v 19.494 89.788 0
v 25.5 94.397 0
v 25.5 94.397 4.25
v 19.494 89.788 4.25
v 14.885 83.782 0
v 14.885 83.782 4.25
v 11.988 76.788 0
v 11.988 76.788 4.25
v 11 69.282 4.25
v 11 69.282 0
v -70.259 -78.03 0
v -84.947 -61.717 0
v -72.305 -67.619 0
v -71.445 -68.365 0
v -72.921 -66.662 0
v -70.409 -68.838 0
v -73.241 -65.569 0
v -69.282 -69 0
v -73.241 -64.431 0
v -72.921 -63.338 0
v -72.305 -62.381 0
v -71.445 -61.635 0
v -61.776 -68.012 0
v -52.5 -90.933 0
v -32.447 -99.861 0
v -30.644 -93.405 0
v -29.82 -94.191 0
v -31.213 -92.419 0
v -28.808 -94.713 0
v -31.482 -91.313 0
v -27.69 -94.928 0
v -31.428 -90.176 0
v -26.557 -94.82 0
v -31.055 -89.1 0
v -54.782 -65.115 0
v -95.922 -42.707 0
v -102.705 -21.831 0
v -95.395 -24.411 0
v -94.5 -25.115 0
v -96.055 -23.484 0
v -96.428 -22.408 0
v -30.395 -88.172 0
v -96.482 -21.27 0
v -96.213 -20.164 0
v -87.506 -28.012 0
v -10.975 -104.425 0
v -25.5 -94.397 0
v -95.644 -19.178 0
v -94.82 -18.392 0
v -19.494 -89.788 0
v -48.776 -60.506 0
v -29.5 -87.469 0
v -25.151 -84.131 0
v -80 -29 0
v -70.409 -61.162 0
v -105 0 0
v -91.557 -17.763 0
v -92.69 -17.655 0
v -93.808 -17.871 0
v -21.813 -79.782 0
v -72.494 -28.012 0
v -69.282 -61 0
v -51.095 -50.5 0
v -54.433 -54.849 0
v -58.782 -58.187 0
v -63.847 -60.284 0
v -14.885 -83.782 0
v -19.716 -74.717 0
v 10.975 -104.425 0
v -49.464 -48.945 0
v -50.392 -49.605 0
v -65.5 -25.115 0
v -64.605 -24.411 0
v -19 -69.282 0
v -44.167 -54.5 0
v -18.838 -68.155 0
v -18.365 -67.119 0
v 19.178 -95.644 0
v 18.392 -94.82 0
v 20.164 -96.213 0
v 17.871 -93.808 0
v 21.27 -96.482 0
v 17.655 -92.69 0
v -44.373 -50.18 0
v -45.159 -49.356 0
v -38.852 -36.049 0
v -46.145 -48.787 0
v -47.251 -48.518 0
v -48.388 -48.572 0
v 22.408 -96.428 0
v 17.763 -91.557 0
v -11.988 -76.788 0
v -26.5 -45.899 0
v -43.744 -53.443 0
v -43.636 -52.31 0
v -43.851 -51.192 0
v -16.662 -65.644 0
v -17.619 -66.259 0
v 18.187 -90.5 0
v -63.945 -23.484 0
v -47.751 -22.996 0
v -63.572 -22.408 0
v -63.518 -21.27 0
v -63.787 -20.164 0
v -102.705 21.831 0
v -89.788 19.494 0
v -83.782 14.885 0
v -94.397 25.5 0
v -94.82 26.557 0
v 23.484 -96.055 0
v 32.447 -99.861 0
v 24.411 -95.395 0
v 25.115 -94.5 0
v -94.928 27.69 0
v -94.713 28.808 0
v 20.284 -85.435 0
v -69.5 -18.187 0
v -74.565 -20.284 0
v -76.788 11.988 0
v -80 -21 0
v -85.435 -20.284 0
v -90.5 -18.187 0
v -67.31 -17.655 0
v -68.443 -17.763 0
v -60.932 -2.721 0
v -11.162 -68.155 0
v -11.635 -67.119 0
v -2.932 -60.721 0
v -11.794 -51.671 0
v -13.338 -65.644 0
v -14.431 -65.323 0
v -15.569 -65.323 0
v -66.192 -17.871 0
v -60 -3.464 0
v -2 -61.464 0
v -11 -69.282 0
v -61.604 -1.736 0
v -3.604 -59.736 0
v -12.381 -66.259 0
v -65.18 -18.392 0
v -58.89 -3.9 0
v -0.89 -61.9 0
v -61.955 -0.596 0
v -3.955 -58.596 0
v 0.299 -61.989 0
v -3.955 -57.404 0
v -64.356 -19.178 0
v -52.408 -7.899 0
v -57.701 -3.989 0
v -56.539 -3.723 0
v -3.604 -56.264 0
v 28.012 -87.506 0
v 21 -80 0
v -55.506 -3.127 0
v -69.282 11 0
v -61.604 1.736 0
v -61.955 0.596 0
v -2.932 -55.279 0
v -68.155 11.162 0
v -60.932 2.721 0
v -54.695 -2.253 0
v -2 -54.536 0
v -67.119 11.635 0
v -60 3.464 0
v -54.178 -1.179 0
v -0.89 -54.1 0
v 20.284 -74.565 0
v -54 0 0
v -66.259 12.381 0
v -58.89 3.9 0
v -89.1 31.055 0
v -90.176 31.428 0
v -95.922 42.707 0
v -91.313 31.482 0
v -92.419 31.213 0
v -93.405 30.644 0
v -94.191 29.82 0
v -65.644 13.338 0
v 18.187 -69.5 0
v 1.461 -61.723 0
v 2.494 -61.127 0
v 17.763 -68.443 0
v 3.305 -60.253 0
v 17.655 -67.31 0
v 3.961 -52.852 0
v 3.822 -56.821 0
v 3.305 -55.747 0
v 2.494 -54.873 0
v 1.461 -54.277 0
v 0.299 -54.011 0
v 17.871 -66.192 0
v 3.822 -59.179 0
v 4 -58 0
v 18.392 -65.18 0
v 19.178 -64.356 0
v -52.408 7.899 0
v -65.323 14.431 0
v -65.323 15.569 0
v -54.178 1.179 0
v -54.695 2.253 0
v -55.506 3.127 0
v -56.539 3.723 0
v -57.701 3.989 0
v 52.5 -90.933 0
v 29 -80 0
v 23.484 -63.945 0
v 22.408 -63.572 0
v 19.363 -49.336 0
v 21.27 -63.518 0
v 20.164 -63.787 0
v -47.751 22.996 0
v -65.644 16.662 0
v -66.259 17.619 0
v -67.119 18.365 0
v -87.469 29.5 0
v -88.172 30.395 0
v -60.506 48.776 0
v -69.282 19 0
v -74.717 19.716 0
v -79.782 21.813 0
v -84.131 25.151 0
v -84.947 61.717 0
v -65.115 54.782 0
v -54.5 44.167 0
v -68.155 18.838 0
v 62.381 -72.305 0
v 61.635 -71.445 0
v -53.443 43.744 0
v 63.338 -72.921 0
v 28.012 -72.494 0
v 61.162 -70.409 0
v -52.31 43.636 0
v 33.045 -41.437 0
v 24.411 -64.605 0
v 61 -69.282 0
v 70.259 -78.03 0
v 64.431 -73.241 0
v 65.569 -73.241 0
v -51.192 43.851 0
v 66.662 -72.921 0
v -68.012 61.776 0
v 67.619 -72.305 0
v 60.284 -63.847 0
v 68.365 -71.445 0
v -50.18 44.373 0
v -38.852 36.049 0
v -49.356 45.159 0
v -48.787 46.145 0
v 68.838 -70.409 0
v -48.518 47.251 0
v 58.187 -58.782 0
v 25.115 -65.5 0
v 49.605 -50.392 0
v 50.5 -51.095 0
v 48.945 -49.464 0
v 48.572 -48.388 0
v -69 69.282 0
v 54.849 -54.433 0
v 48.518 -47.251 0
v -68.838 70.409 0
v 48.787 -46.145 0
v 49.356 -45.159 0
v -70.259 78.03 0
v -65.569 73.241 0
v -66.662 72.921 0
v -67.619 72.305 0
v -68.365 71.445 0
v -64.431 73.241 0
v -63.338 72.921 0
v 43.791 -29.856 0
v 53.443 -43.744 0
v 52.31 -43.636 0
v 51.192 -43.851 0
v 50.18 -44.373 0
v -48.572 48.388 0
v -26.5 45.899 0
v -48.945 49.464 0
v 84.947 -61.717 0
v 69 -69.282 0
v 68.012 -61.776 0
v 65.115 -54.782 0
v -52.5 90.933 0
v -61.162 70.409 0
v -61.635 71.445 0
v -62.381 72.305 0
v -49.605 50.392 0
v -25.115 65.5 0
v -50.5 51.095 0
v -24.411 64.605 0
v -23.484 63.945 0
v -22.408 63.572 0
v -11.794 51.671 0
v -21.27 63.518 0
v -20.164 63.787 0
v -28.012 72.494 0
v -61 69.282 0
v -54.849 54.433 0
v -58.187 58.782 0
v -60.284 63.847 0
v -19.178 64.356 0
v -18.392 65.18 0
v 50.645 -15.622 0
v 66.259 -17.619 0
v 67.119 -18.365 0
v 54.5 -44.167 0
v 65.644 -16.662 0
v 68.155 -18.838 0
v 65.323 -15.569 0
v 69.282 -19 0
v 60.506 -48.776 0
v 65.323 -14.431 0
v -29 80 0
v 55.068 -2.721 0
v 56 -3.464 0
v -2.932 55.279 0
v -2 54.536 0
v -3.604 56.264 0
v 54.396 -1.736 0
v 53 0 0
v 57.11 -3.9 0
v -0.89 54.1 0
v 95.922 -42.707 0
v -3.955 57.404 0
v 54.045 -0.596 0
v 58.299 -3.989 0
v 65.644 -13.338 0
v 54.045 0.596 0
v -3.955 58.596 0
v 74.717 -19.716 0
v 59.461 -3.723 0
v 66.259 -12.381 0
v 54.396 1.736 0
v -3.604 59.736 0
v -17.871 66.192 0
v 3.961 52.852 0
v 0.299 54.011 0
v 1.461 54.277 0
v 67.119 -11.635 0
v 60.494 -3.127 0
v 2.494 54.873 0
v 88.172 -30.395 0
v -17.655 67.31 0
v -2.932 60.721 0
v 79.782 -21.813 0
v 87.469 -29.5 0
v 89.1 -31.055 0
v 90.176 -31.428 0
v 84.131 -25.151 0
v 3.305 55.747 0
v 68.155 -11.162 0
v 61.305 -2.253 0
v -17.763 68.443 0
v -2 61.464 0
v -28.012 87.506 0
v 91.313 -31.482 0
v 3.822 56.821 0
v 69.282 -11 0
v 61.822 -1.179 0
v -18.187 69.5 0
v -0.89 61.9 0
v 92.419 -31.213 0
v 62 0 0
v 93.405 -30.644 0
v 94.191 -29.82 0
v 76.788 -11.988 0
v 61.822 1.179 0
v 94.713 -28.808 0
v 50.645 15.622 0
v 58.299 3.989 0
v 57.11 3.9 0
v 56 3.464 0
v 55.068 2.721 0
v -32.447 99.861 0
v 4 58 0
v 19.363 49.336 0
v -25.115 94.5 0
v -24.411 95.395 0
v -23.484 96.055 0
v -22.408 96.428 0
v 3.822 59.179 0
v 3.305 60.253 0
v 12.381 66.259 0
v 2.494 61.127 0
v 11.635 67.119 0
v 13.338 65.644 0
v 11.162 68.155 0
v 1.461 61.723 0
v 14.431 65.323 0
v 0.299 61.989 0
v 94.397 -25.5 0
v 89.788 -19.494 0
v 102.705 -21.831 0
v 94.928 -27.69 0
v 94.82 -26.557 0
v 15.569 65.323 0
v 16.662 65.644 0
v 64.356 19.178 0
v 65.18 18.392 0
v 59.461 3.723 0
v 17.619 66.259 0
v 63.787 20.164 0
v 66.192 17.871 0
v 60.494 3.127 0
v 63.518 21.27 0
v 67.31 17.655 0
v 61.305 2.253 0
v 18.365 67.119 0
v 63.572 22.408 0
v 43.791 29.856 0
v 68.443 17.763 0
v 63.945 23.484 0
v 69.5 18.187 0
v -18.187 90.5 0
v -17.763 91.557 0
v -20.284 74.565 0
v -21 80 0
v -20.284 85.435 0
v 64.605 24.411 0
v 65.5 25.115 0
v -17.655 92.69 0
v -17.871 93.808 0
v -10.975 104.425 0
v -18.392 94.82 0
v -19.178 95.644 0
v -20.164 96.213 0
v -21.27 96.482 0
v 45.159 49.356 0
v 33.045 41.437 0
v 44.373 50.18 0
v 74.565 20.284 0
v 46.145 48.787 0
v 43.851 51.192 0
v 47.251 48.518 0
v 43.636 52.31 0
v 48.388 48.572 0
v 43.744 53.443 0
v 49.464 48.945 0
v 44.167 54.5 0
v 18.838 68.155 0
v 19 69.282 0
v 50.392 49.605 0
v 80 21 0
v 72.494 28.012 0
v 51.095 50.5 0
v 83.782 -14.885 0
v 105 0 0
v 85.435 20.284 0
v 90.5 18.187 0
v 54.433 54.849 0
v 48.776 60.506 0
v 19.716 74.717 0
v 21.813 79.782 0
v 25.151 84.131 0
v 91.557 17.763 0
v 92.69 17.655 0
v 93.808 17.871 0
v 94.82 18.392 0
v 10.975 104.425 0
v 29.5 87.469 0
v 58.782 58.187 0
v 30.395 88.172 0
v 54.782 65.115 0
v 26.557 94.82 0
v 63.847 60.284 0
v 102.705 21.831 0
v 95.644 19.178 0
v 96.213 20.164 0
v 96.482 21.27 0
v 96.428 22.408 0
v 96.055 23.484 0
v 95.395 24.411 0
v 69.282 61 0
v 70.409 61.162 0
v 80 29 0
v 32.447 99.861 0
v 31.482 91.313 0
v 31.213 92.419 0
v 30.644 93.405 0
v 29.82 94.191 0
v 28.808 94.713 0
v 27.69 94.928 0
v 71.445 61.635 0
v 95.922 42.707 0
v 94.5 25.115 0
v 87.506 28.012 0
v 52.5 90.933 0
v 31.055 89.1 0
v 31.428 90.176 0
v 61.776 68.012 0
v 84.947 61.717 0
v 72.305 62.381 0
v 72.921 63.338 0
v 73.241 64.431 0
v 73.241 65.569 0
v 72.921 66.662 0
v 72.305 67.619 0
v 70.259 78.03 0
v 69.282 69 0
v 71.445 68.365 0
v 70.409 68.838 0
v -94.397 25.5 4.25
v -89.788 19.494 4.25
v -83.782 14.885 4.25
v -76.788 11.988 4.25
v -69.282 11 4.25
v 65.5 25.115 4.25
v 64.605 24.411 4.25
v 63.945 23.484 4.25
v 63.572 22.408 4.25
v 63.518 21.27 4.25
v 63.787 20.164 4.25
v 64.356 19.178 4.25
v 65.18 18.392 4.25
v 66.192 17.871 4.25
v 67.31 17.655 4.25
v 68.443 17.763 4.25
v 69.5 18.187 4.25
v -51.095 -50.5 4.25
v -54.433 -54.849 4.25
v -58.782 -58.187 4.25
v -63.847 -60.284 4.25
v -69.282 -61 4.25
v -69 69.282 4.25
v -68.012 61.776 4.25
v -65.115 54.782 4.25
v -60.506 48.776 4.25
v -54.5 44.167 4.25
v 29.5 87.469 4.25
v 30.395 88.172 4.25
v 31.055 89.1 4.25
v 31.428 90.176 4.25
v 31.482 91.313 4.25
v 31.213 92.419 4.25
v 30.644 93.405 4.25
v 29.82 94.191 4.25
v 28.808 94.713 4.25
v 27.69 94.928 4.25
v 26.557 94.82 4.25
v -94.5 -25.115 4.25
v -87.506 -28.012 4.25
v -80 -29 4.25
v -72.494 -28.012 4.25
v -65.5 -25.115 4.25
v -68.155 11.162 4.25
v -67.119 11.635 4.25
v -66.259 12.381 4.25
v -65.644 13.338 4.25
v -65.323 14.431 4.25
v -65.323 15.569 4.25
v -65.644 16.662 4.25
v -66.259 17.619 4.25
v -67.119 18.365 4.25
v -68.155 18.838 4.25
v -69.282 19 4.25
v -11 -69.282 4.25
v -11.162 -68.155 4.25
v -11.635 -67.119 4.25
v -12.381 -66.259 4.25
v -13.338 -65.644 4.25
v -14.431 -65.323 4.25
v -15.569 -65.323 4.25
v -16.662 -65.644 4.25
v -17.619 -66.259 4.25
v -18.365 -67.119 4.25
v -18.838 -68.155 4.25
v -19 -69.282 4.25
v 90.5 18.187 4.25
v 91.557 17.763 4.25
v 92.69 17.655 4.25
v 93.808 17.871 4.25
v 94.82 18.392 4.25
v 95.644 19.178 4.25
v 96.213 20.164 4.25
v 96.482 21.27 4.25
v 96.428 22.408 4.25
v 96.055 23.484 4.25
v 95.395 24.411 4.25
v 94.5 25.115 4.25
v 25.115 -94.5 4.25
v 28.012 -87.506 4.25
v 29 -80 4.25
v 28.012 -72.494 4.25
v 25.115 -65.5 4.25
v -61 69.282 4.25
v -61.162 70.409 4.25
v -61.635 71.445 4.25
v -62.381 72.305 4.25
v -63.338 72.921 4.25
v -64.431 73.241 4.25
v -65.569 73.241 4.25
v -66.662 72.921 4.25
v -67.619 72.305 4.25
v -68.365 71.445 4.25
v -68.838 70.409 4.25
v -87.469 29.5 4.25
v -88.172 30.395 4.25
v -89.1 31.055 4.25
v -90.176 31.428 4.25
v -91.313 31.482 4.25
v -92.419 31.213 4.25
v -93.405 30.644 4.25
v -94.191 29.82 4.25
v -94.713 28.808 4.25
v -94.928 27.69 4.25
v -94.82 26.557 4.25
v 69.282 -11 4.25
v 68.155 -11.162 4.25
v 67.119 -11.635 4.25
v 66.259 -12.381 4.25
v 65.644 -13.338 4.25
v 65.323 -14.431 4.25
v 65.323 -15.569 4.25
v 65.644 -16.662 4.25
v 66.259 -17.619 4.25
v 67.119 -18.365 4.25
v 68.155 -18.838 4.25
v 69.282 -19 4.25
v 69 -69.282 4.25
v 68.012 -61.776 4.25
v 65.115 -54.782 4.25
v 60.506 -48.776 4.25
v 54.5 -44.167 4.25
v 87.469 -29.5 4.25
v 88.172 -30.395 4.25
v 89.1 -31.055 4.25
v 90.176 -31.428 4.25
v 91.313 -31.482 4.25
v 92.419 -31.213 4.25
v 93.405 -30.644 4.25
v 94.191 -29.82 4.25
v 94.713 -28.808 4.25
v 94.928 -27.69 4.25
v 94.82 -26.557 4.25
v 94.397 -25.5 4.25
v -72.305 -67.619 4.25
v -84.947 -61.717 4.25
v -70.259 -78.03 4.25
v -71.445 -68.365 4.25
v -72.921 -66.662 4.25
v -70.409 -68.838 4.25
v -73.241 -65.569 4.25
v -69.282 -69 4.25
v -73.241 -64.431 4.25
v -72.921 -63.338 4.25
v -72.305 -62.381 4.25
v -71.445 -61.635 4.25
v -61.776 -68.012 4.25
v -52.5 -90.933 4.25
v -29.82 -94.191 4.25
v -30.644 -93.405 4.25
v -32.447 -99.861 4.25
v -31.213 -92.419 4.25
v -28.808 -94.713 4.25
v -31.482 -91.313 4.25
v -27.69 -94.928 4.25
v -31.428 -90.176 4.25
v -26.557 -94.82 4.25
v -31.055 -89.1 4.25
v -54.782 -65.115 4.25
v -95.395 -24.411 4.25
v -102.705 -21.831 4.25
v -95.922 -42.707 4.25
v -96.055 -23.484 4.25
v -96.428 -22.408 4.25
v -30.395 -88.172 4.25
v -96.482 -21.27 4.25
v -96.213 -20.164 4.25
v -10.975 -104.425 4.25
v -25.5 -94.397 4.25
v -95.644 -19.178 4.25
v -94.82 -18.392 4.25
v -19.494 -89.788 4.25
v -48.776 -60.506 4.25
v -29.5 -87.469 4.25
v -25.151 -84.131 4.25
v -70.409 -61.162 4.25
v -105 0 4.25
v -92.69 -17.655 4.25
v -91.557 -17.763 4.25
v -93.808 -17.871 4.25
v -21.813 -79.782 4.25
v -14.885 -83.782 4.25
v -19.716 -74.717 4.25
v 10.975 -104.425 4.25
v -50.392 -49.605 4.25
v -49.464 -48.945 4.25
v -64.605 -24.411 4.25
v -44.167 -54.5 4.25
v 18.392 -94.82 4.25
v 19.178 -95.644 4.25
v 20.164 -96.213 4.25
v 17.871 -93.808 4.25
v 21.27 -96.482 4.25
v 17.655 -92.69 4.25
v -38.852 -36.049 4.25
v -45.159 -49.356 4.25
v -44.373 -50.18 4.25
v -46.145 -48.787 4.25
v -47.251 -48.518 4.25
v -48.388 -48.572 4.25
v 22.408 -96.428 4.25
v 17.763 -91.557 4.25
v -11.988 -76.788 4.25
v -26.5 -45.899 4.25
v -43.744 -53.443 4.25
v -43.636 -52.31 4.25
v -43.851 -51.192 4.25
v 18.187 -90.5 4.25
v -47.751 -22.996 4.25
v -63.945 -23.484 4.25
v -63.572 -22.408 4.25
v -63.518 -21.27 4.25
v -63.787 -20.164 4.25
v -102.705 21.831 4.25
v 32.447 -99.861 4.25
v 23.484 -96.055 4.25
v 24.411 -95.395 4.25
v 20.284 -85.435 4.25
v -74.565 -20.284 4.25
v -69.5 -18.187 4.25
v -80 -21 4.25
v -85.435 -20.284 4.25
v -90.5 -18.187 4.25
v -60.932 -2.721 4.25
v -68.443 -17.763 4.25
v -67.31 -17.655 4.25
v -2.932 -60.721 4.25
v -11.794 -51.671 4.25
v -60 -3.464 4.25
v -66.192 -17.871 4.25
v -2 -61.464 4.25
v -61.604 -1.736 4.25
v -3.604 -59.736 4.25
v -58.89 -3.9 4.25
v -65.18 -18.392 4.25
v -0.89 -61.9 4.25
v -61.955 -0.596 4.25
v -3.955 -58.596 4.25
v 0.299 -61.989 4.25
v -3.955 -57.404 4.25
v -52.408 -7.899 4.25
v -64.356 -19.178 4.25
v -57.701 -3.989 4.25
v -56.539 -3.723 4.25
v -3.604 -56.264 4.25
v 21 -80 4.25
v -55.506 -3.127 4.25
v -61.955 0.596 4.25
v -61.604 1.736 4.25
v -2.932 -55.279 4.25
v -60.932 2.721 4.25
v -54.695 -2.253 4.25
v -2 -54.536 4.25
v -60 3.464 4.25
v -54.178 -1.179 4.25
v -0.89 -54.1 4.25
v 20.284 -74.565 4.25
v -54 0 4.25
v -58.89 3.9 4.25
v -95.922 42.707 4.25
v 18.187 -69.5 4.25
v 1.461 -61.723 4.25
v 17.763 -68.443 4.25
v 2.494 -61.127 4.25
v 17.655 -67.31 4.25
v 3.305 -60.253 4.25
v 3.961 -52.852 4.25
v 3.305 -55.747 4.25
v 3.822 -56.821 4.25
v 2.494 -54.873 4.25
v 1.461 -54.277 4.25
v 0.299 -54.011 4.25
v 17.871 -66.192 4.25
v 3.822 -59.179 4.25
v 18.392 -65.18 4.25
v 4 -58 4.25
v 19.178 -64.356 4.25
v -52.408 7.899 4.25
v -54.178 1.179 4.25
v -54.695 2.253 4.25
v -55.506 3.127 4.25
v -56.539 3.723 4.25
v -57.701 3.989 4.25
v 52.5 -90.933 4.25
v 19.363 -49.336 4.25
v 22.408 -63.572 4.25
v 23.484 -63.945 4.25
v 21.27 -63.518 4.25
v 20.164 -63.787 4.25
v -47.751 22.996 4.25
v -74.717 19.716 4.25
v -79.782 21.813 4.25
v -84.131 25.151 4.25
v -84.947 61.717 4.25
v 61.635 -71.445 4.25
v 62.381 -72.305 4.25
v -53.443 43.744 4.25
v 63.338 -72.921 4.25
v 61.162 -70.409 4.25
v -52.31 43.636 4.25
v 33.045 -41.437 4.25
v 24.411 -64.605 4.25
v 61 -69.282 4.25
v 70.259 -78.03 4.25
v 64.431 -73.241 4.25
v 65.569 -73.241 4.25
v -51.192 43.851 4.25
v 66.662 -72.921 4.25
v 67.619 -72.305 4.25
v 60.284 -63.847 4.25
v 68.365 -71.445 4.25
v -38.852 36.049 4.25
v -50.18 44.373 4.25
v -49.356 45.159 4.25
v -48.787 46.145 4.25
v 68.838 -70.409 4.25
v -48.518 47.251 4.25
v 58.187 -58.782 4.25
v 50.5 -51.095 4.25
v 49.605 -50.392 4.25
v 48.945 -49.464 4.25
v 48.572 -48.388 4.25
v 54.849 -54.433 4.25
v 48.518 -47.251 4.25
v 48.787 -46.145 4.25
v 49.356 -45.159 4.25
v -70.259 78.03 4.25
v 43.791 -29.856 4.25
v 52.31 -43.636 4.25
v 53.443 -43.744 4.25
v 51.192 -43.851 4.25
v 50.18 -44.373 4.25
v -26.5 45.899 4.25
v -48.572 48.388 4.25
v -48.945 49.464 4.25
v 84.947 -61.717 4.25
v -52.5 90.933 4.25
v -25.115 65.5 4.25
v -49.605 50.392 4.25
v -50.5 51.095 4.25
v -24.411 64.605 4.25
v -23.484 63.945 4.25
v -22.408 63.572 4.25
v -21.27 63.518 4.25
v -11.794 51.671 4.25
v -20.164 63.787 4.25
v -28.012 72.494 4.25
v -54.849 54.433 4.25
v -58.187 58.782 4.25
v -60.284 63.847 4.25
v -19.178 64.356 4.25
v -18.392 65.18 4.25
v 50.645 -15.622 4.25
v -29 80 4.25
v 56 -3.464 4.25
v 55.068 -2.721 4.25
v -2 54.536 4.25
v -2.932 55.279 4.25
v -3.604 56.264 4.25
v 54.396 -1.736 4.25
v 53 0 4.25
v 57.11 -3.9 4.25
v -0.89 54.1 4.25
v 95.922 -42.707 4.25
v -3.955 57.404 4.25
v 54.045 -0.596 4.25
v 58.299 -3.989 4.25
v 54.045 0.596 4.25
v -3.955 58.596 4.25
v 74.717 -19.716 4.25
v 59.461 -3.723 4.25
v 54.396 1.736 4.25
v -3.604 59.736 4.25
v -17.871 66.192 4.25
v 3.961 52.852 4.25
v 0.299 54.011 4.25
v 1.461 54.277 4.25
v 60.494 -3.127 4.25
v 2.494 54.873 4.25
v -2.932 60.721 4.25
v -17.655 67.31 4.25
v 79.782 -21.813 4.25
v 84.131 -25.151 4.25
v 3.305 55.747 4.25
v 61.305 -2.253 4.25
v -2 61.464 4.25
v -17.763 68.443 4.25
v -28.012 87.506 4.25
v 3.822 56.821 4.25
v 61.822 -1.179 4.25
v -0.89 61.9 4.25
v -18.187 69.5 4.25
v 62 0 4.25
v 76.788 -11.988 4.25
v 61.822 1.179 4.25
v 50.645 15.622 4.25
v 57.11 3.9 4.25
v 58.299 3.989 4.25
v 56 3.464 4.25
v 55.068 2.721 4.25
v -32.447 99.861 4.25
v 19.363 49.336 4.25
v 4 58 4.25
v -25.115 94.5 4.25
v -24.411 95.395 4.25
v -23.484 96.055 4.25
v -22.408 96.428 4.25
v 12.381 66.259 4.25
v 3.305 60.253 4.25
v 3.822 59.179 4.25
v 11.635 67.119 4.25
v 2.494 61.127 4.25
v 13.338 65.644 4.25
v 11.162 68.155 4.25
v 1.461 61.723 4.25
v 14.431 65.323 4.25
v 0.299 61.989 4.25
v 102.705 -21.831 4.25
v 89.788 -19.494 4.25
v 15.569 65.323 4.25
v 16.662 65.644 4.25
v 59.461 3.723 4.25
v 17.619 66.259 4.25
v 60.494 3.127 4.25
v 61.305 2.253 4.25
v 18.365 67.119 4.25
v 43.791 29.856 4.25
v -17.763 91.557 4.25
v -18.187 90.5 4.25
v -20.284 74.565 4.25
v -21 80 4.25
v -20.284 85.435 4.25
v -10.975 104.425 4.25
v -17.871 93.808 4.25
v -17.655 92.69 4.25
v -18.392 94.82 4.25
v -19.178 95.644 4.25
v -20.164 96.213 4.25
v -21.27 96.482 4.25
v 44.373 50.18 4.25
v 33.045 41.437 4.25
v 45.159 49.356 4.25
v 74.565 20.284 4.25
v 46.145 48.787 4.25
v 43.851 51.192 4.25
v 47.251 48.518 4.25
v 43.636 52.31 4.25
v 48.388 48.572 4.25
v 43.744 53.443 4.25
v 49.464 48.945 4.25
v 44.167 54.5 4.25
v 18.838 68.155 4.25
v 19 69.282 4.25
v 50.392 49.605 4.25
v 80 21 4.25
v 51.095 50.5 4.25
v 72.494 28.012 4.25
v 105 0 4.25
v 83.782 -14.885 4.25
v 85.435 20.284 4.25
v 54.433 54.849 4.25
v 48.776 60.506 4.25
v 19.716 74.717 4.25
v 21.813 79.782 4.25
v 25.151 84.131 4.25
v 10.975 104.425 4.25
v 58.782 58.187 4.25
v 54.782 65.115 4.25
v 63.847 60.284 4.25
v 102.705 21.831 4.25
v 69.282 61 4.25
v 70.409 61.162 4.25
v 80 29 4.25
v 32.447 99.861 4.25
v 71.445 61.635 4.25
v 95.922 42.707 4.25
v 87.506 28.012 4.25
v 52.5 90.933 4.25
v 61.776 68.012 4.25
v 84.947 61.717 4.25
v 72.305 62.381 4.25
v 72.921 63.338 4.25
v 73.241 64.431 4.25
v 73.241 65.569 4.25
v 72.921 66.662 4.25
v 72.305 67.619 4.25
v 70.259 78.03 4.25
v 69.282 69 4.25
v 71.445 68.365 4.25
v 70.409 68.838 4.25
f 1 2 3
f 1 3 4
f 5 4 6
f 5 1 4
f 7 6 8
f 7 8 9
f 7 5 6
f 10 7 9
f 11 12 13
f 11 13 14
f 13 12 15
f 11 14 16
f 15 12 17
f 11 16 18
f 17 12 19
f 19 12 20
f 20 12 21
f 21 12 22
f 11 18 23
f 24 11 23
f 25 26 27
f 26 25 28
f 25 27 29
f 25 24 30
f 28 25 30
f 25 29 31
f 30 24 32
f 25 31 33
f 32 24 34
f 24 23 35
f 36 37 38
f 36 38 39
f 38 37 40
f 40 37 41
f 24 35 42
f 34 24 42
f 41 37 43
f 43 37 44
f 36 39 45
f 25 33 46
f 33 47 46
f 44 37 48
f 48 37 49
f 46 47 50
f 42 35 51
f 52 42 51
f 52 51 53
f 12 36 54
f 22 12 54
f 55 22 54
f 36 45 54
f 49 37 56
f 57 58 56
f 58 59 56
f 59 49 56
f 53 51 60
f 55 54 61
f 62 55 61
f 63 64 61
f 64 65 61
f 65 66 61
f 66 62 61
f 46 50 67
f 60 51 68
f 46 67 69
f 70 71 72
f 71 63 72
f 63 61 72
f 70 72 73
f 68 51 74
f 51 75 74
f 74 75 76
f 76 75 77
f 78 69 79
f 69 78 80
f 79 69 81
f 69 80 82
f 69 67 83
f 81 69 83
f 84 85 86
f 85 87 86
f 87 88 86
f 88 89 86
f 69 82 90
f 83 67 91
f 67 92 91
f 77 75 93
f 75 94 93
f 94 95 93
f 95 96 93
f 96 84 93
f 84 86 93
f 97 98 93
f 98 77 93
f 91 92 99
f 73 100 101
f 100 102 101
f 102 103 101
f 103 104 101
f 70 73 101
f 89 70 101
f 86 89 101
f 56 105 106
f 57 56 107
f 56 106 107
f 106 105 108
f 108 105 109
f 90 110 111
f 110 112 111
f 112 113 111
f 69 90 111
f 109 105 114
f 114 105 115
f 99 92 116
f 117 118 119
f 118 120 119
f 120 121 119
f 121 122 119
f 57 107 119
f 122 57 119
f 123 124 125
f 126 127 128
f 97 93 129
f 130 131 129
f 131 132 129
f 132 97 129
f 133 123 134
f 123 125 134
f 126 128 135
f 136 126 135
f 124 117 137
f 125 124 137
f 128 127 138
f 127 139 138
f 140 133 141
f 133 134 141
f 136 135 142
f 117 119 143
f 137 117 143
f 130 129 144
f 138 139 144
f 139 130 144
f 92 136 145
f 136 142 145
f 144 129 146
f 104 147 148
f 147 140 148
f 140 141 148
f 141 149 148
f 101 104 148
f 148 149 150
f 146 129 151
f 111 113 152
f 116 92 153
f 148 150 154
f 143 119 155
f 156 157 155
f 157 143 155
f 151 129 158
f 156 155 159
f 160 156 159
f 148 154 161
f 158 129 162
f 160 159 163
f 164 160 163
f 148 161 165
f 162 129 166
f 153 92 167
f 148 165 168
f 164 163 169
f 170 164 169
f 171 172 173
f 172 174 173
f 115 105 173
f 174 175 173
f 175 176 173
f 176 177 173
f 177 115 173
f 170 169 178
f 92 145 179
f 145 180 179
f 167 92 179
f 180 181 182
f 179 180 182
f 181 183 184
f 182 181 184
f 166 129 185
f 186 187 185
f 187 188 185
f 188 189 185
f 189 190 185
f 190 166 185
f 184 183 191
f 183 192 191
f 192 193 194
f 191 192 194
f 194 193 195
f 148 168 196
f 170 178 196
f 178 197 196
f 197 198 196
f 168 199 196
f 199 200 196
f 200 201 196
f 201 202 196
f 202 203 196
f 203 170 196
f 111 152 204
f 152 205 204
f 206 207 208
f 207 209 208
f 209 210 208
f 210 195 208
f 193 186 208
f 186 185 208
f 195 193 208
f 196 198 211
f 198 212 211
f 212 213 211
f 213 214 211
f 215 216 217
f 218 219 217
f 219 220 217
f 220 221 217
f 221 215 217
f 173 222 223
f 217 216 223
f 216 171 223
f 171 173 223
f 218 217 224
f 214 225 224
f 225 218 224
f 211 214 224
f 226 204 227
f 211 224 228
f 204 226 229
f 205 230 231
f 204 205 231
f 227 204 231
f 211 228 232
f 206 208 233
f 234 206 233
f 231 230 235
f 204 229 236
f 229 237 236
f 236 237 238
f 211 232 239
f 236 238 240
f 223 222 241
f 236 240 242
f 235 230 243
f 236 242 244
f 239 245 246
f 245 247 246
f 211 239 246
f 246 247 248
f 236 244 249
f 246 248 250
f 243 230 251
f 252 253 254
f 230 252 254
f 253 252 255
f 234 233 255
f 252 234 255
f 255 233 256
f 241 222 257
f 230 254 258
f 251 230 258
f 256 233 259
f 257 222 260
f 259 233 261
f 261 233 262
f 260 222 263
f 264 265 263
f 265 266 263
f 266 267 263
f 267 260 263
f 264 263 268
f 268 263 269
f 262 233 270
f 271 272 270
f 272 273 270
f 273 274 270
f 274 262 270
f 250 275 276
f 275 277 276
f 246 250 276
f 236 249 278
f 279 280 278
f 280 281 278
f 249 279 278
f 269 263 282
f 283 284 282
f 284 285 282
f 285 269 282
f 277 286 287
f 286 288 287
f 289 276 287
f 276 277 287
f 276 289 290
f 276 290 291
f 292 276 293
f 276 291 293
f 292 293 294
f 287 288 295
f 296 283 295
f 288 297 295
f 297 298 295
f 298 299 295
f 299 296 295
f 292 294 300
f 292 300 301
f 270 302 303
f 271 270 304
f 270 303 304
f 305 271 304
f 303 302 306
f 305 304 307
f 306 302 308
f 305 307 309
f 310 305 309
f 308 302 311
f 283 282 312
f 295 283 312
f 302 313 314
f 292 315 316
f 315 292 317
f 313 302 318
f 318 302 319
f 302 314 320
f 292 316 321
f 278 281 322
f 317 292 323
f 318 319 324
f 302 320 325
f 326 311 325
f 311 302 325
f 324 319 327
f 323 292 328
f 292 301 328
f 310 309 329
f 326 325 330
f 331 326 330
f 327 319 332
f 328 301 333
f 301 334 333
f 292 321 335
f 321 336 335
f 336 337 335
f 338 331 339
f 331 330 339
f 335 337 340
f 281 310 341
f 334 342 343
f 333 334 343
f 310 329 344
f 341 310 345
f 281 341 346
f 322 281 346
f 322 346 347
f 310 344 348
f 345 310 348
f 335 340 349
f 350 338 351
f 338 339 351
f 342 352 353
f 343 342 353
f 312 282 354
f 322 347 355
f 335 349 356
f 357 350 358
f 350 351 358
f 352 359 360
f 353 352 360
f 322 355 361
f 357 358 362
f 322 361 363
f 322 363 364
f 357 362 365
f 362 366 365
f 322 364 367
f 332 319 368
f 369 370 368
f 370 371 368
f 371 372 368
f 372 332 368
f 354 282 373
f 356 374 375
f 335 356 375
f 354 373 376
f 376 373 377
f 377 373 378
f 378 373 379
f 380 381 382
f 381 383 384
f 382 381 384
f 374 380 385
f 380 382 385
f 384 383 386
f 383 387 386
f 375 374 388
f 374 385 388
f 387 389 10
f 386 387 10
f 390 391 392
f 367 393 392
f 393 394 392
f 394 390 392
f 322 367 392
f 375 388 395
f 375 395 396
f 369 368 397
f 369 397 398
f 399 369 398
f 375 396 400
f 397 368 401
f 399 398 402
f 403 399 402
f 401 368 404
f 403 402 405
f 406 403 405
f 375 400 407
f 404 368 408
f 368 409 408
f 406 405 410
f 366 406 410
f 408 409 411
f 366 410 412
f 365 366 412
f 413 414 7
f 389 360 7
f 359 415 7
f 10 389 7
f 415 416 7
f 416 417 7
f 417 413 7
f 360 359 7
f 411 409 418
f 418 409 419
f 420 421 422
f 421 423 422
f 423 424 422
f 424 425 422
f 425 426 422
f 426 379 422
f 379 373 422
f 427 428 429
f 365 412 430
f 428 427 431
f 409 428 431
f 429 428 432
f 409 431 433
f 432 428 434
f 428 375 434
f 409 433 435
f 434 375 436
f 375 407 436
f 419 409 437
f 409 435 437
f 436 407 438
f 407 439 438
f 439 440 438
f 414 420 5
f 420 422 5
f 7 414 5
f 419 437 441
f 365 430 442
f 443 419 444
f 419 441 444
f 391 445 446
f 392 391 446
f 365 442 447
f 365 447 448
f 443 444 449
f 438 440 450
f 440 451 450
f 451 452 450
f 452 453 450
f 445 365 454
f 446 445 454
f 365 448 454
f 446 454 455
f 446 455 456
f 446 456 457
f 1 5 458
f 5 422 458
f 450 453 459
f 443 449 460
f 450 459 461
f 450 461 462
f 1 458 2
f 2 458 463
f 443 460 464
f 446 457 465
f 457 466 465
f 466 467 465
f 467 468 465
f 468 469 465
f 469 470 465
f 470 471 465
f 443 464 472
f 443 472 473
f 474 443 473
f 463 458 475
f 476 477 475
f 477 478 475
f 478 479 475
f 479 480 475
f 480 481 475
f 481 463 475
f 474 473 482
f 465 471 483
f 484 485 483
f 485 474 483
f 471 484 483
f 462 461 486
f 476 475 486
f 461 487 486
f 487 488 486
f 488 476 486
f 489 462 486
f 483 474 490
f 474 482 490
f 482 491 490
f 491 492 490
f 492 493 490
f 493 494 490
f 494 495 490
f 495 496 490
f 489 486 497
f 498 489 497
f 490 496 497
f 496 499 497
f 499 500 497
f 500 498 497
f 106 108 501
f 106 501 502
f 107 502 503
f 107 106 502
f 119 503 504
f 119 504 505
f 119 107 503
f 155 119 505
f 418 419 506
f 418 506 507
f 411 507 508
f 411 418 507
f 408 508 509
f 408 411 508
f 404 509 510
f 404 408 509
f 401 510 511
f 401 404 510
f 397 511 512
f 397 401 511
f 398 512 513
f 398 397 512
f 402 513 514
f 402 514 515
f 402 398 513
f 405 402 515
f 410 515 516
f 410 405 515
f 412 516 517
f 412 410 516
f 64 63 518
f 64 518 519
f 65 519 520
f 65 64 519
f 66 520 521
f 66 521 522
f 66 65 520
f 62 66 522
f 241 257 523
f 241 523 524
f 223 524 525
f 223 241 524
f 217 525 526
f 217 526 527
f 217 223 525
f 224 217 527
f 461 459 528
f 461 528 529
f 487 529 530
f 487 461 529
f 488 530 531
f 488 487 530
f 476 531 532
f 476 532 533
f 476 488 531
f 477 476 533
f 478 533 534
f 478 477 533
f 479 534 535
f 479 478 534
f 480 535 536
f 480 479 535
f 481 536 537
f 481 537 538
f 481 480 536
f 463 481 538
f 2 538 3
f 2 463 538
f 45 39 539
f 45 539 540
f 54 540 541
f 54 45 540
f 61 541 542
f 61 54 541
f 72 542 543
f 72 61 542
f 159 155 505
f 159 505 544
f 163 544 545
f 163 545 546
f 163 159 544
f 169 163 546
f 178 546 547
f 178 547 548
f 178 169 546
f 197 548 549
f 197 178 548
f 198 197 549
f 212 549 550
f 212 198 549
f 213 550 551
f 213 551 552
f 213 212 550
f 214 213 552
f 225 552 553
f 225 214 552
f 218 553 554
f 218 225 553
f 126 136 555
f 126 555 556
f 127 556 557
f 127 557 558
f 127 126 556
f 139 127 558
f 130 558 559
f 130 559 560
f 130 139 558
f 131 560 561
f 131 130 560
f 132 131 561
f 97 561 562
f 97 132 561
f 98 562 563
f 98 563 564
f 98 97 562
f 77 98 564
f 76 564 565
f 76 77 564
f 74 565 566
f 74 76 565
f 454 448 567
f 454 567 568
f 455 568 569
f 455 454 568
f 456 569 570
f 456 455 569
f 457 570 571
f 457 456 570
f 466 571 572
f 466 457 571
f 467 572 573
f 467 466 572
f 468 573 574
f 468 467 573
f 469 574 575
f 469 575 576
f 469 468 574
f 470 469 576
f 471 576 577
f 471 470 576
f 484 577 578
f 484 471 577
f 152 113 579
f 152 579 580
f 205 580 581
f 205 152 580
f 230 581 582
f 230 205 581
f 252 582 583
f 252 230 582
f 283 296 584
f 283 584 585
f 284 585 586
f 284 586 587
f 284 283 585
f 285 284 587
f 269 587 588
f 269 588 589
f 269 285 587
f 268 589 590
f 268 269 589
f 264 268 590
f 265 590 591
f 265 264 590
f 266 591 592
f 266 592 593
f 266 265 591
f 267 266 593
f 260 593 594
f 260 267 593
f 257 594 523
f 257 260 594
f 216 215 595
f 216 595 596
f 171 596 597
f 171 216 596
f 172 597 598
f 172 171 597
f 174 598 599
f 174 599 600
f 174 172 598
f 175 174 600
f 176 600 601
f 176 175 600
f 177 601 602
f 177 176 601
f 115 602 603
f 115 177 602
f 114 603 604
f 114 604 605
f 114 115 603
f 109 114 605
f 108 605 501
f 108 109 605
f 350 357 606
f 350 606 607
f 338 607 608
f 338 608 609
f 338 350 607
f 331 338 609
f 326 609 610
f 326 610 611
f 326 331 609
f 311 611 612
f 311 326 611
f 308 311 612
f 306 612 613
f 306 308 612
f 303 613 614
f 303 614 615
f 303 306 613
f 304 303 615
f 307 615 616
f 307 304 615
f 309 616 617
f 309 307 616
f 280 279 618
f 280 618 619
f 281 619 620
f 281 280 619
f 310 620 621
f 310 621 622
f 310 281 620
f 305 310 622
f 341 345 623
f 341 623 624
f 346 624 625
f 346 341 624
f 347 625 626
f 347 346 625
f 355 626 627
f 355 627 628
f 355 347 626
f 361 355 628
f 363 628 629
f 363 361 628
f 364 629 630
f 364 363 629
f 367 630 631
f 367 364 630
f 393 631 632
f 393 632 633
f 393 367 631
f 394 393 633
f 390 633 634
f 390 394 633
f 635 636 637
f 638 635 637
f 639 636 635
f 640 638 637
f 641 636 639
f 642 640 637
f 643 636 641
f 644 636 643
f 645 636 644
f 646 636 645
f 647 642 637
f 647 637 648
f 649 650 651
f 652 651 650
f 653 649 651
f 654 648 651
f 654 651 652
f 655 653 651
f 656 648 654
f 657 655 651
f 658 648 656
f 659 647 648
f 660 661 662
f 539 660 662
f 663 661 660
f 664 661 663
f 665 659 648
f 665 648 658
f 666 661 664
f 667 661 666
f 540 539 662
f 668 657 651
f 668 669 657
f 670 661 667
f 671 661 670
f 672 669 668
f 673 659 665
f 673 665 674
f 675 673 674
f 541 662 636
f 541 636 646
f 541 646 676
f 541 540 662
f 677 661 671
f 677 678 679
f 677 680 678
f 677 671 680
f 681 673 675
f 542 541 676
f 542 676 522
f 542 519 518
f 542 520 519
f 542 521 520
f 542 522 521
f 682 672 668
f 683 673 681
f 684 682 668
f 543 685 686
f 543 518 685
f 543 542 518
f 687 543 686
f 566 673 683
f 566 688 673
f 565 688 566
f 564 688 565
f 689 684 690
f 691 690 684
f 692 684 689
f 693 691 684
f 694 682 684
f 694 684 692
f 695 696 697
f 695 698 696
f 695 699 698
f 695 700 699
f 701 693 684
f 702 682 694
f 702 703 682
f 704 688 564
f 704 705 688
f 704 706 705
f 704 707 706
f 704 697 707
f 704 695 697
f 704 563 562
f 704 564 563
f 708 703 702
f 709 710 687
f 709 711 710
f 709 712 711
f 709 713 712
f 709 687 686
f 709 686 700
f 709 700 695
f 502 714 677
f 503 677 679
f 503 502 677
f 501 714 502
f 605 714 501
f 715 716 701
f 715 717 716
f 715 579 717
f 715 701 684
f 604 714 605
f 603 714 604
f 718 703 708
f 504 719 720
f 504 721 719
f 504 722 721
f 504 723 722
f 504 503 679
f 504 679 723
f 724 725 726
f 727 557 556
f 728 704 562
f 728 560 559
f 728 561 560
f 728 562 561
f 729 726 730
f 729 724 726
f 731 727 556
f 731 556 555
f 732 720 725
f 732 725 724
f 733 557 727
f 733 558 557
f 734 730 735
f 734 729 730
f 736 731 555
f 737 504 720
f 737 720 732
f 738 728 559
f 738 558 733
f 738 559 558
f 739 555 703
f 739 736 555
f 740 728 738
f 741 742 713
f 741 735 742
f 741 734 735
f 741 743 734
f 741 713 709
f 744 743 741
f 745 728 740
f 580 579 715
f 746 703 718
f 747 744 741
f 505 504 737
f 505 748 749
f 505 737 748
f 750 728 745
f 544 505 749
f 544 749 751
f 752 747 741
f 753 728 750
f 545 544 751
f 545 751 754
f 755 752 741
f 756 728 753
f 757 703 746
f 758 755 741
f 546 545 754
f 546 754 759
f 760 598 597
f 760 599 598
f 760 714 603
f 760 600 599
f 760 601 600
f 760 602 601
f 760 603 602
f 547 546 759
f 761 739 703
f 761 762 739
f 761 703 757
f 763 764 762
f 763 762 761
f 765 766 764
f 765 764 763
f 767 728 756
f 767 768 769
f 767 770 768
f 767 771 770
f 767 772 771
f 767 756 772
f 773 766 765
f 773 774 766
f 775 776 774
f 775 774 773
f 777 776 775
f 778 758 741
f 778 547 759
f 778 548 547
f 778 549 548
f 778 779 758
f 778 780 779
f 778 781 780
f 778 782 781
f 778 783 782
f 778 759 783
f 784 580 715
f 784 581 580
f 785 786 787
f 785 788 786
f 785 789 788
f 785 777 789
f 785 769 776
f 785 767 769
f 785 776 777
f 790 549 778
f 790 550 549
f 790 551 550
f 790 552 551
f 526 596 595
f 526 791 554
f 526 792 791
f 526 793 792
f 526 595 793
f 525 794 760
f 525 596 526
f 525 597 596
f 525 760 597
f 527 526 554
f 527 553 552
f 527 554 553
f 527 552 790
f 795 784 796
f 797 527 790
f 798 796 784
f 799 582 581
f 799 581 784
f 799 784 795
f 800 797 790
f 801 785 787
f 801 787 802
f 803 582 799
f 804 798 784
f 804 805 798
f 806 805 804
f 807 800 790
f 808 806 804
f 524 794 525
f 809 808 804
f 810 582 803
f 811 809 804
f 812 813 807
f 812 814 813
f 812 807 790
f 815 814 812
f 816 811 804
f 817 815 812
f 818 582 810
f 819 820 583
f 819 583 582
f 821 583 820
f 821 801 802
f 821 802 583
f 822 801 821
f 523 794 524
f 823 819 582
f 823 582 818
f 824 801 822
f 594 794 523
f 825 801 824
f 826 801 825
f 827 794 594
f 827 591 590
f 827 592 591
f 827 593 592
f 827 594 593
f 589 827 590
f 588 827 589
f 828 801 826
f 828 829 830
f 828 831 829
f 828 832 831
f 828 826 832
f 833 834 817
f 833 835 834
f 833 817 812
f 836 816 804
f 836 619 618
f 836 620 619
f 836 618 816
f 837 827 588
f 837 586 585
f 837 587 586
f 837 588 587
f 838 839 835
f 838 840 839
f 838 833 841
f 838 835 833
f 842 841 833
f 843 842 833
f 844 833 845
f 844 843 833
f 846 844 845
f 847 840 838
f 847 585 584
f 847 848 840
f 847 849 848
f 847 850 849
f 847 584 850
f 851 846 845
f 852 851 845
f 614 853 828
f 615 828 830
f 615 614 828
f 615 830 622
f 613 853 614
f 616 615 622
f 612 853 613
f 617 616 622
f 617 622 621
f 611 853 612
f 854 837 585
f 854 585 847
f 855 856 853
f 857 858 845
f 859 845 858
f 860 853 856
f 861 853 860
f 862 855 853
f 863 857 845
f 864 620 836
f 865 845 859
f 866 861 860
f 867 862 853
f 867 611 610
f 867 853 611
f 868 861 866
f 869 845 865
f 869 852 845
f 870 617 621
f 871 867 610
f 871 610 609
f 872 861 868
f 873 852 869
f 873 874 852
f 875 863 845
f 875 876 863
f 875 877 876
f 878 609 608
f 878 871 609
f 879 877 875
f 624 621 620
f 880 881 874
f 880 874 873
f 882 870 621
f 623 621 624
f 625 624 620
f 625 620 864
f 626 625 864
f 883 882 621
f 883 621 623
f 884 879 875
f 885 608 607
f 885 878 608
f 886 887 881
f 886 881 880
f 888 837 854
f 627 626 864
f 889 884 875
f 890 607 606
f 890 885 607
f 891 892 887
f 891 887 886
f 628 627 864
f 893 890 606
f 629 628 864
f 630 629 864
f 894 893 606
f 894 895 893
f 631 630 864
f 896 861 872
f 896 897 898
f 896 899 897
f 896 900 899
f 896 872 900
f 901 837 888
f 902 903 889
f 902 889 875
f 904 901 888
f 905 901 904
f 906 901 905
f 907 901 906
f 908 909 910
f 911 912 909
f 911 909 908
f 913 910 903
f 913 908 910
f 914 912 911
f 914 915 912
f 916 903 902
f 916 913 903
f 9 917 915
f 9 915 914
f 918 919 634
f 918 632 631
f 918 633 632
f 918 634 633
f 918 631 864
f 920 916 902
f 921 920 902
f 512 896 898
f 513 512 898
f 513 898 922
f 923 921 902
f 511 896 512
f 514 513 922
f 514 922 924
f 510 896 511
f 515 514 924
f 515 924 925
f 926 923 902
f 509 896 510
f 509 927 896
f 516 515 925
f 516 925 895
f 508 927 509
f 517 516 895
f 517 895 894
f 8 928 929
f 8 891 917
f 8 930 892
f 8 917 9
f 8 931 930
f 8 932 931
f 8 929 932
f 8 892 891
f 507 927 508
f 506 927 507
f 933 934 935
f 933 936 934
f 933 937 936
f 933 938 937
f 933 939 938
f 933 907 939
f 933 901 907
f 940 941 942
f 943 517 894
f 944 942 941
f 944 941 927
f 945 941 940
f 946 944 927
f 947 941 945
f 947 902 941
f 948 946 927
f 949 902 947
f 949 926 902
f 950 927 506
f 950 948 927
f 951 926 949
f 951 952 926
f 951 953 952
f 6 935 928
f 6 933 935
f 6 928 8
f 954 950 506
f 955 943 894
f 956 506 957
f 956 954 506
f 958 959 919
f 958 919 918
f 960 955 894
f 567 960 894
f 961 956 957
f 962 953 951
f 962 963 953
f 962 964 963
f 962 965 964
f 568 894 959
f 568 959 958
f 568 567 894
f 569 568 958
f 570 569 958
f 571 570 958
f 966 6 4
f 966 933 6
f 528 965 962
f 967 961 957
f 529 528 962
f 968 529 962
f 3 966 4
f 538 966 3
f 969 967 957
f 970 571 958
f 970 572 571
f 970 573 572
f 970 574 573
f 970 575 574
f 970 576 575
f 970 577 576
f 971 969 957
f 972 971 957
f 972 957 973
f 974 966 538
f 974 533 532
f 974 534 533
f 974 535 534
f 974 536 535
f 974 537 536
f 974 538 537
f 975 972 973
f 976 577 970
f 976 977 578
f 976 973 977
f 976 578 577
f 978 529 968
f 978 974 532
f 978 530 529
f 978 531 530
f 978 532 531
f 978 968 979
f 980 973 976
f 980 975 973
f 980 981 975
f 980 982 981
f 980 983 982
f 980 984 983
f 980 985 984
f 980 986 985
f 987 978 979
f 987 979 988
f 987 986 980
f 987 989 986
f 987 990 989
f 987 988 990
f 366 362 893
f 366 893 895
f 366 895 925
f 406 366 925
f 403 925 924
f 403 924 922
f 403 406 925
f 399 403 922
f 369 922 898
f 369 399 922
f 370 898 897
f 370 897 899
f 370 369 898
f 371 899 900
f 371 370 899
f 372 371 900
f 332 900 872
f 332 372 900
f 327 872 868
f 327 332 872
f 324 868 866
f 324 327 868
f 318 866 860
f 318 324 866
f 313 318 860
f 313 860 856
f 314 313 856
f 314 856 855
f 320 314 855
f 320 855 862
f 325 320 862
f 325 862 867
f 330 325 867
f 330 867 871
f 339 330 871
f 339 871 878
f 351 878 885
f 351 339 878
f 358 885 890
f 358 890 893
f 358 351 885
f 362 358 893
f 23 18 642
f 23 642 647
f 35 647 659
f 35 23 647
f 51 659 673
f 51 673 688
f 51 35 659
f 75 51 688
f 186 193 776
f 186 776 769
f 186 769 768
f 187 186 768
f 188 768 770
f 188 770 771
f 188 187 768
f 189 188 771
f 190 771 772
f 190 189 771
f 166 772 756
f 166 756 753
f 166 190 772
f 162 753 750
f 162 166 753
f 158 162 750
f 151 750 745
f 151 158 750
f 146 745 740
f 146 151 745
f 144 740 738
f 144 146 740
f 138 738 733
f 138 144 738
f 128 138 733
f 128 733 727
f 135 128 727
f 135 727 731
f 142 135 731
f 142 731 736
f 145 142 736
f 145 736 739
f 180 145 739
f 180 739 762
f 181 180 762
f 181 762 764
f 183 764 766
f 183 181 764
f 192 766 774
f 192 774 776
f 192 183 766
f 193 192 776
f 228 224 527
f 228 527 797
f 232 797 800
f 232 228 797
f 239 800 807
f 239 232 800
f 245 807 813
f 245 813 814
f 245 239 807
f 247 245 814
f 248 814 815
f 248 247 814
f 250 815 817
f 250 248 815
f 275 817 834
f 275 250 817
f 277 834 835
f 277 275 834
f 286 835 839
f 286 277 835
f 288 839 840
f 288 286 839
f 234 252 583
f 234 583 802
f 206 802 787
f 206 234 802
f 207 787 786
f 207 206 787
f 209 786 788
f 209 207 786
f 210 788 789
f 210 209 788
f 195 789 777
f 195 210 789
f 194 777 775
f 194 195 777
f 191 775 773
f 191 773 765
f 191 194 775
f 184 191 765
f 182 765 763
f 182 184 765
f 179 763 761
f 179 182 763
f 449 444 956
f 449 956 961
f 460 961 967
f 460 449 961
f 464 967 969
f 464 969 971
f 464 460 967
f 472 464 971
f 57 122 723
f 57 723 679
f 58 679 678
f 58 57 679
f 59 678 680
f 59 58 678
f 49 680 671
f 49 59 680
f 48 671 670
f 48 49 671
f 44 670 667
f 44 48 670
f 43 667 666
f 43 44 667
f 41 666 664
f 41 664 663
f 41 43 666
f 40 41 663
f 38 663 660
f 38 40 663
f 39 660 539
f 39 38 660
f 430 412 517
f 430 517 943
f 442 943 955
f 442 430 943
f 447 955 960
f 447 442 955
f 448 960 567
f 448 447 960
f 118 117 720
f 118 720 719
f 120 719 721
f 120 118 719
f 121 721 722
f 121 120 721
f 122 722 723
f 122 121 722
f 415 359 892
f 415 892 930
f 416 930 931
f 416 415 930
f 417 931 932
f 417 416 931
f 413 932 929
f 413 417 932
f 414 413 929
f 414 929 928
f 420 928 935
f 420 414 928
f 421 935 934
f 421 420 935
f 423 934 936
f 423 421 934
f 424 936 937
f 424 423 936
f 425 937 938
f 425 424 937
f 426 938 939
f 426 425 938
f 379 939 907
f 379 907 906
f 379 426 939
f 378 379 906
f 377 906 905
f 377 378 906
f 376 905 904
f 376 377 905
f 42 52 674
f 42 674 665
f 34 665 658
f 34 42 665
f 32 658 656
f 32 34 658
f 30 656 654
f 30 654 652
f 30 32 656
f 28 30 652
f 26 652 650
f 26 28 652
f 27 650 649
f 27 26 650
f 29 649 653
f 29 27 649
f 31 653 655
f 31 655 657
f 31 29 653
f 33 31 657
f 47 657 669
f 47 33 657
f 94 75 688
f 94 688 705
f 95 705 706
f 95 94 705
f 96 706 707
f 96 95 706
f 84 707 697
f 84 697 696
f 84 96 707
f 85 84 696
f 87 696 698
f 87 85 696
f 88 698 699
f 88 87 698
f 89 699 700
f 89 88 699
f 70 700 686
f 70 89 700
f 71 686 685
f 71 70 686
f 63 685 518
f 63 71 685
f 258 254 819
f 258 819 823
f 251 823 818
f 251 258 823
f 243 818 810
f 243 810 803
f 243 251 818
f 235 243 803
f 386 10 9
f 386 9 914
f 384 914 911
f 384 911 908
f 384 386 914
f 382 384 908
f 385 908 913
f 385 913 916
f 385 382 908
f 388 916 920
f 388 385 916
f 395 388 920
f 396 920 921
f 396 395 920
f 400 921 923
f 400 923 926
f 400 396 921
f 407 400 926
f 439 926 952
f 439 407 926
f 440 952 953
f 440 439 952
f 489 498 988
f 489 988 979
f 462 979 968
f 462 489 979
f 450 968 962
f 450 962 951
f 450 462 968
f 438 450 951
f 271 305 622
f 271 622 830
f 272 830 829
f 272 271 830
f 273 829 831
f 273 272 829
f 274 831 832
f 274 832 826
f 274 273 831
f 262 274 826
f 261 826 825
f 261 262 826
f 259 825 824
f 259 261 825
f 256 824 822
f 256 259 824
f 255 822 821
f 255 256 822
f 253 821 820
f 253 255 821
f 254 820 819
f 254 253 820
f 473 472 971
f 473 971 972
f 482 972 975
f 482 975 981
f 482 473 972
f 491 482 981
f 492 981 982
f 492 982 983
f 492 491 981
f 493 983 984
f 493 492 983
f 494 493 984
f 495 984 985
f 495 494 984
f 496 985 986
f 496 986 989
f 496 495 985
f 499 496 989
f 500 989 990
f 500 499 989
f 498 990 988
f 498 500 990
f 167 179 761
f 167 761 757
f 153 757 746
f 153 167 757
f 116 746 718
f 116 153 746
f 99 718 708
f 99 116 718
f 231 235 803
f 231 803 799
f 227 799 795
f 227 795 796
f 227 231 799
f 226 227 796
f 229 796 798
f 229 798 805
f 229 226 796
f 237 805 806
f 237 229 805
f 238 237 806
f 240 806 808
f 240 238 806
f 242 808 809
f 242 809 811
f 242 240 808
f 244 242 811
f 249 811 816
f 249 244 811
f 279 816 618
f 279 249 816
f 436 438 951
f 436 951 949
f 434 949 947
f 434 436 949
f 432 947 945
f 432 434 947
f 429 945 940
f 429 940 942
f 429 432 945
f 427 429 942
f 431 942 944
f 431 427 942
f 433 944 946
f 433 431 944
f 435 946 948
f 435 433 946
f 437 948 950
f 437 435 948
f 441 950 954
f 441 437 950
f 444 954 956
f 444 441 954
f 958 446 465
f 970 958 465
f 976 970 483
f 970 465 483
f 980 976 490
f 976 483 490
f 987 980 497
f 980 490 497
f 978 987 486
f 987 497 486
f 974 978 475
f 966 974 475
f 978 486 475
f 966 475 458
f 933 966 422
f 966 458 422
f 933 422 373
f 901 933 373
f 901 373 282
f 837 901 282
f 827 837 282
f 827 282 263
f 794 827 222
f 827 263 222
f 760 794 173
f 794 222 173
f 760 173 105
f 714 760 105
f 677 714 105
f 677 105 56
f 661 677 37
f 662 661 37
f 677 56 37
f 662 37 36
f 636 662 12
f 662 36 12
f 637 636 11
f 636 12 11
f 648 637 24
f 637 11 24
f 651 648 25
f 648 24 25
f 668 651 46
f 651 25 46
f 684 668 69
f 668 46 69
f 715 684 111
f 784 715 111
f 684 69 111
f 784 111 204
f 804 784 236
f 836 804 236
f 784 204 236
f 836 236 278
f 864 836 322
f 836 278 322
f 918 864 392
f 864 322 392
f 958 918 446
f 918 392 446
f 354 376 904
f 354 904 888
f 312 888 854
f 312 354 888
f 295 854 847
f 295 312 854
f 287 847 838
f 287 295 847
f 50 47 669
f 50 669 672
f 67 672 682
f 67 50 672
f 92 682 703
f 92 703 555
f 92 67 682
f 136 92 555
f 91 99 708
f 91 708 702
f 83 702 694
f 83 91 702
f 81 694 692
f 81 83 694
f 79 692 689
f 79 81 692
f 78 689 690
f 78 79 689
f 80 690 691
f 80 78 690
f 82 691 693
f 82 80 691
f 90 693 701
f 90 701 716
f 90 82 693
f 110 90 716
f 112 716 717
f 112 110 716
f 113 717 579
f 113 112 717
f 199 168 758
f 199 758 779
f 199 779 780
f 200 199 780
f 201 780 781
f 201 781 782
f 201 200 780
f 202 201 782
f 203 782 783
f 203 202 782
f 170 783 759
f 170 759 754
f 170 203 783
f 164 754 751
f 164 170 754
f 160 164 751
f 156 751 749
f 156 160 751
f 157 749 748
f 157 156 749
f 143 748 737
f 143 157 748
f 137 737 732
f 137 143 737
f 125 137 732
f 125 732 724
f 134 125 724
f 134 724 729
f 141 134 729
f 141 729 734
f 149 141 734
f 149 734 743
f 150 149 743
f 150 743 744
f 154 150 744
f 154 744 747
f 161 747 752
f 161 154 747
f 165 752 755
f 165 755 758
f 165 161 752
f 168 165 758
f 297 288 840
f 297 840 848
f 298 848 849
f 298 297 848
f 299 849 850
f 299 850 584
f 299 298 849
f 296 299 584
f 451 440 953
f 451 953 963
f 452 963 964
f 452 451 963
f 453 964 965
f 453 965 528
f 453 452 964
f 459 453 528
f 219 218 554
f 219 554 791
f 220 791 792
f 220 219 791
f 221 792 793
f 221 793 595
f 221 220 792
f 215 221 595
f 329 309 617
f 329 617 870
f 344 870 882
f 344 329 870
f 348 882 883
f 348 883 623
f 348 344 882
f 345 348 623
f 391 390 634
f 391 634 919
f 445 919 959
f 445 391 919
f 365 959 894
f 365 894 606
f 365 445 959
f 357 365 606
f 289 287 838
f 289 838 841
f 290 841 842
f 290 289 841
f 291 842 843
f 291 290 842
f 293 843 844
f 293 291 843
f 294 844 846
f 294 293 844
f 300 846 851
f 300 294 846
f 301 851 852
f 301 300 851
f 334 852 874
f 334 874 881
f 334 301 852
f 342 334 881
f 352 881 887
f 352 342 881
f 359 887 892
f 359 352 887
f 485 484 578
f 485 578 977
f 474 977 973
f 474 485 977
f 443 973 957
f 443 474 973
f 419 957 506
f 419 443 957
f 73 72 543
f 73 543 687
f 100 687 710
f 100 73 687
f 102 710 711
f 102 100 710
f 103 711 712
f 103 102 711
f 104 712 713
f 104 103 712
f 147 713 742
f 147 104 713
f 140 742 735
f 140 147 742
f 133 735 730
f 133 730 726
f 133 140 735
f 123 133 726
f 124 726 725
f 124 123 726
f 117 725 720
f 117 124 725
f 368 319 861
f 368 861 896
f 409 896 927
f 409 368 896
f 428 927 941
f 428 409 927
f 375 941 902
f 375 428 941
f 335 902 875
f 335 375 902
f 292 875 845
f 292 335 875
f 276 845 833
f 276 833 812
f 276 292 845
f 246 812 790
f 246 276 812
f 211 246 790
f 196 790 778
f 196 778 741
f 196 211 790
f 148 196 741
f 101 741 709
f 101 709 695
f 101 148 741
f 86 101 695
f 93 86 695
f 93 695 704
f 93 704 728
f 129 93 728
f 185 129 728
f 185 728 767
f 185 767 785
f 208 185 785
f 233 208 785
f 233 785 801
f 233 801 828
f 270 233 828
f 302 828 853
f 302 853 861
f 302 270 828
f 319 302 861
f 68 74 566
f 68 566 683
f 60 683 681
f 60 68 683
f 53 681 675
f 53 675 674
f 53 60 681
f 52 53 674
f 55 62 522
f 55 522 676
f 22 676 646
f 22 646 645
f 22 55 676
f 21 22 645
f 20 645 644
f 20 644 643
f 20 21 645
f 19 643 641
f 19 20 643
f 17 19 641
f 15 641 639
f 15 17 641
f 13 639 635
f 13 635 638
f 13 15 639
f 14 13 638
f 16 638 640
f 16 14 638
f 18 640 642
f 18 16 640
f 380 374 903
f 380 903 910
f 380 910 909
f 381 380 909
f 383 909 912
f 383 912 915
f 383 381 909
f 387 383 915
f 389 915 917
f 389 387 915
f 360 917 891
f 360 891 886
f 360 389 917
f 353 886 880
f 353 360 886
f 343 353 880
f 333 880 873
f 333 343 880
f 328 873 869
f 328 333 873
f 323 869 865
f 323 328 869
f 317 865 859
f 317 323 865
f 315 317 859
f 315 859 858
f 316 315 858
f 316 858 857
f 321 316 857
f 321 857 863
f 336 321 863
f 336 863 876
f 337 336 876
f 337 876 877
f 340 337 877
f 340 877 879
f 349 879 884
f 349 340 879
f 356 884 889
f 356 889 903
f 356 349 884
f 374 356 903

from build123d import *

# Parameters (mm, degrees)
SKETCH1_R           = 105
SKETCH1_R_2         = 53
SKETCH1_R_3         = 4
BOSS_EXTRUDE1_DEPTH = 4.25


with BuildPart() as part:
    # Sketch1 → Boss-Extrude1 (new body)
    with BuildSketch(Plane.XY):
        Circle(SKETCH1_R)
        Circle(SKETCH1_R_2, mode=Mode.SUBTRACT)
        with Locations((0, 58)):
            Circle(SKETCH1_R_3, mode=Mode.SUBTRACT)
        with Locations((58, 0)):
            Circle(SKETCH1_R_3, mode=Mode.SUBTRACT)
        with Locations((0, -58)):
            Circle(SKETCH1_R_3, mode=Mode.SUBTRACT)
        with Locations((-58, 0)):
            Circle(SKETCH1_R_3, mode=Mode.SUBTRACT)
        with BuildLine():
            ThreePointArc((94.5, 25.11473671), (80, 29), (65.5, 25.11473671))
            ThreePointArc((65.5, 25.11473671), (64.035898385, 19.650635095), (69.5, 18.186533479))
            ThreePointArc((69.5, 18.186533479), (80, 21), (90.5, 18.186533479))
            ThreePointArc((90.5, 18.186533479), (95.964101615, 19.650635095), (94.5, 25.11473671))
        make_face(mode=Mode.SUBTRACT)
        with BuildLine():
            ThreePointArc((94.396769013, -25.5), (83.782032303, -14.88526329), (69.282032303, -11))
            ThreePointArc((69.282032303, -11), (65.282032303, -15), (69.282032303, -19))
            ThreePointArc((69.282032303, -19), (79.782032303, -21.813466521), (87.468565782, -29.5))
            ThreePointArc((87.468565782, -29.5), (92.932667397, -30.964101615), (94.396769013, -25.5))
        make_face(mode=Mode.SUBTRACT)
        with BuildLine():
            ThreePointArc((69, -69.282032303), (65.11473671, -54.782032303), (54.5, -44.167295593))
            ThreePointArc((54.5, -44.167295593), (49.035898385, -45.631397208), (50.5, -51.095498823))
            ThreePointArc((50.5, -51.095498823), (58.186533479, -58.782032303), (61, -69.282032303))
            ThreePointArc((61, -69.282032303), (65, -73.282032303), (69, -69.282032303))
        make_face(mode=Mode.SUBTRACT)
        with BuildLine():
            ThreePointArc((25.11473671, -94.5), (29, -80), (25.11473671, -65.5))
            ThreePointArc((25.11473671, -65.5), (19.650635095, -64.035898385), (18.186533479, -69.5))
            ThreePointArc((18.186533479, -69.5), (21, -80), (18.186533479, -90.5))
            ThreePointArc((18.186533479, -90.5), (19.650635095, -95.964101615), (25.11473671, -94.5))
        make_face(mode=Mode.SUBTRACT)
        with BuildLine():
            ThreePointArc((-25.5, -94.396769013), (-14.88526329, -83.782032303), (-11, -69.282032303))
            ThreePointArc((-11, -69.282032303), (-15, -65.282032303), (-19, -69.282032303))
            ThreePointArc((-19, -69.282032303), (-21.813466521, -79.782032303), (-29.5, -87.468565782))
            ThreePointArc((-29.5, -87.468565782), (-30.964101615, -92.932667397), (-25.5, -94.396769013))
        make_face(mode=Mode.SUBTRACT)
        with BuildLine():
            ThreePointArc((-69.282032303, -69), (-54.782032303, -65.11473671), (-44.167295593, -54.5))
            ThreePointArc((-44.167295593, -54.5), (-45.631397208, -49.035898385), (-51.095498823, -50.5))
            ThreePointArc((-51.095498823, -50.5), (-58.782032303, -58.186533479), (-69.282032303, -61))
            ThreePointArc((-69.282032303, -61), (-73.282032303, -65), (-69.282032303, -69))
        make_face(mode=Mode.SUBTRACT)
        with BuildLine():
            ThreePointArc((-94.5, -25.11473671), (-80, -29), (-65.5, -25.11473671))
            ThreePointArc((-65.5, -25.11473671), (-64.035898385, -19.650635095), (-69.5, -18.186533479))
            ThreePointArc((-69.5, -18.186533479), (-80, -21), (-90.5, -18.186533479))
            ThreePointArc((-90.5, -18.186533479), (-95.964101615, -19.650635095), (-94.5, -25.11473671))
        make_face(mode=Mode.SUBTRACT)
        with BuildLine():
            ThreePointArc((-94.396769013, 25.5), (-83.782032303, 14.88526329), (-69.282032303, 11))
            ThreePointArc((-69.282032303, 11), (-65.282032303, 15), (-69.282032303, 19))
            ThreePointArc((-69.282032303, 19), (-79.782032303, 21.813466521), (-87.468565782, 29.5))
            ThreePointArc((-87.468565782, 29.5), (-92.932667397, 30.964101615), (-94.396769013, 25.5))
        make_face(mode=Mode.SUBTRACT)
        with BuildLine():
            ThreePointArc((-69, 69.282032303), (-65.11473671, 54.782032303), (-54.5, 44.167295593))
            ThreePointArc((-54.5, 44.167295593), (-49.035898385, 45.631397208), (-50.5, 51.095498823))
            ThreePointArc((-50.5, 51.095498823), (-58.186533479, 58.782032303), (-61, 69.282032303))
            ThreePointArc((-61, 69.282032303), (-65, 73.282032303), (-69, 69.282032303))
        make_face(mode=Mode.SUBTRACT)
        with BuildLine():
            ThreePointArc((-25.11473671, 94.5), (-29, 80), (-25.11473671, 65.5))
            ThreePointArc((-25.11473671, 65.5), (-19.650635095, 64.035898385), (-18.186533479, 69.5))
            ThreePointArc((-18.186533479, 69.5), (-21, 80), (-18.186533479, 90.5))
            ThreePointArc((-18.186533479, 90.5), (-19.650635095, 95.964101615), (-25.11473671, 94.5))
        make_face(mode=Mode.SUBTRACT)
        with BuildLine():
            ThreePointArc((25.5, 94.396769013), (14.88526329, 83.782032303), (11, 69.282032303))
            ThreePointArc((11, 69.282032303), (15, 65.282032303), (19, 69.282032303))
            ThreePointArc((19, 69.282032303), (21.813466521, 79.782032303), (29.5, 87.468565782))
            ThreePointArc((29.5, 87.468565782), (30.964101615, 92.932667397), (25.5, 94.396769013))
        make_face(mode=Mode.SUBTRACT)
        with BuildLine():
            ThreePointArc((69.282032303, 69), (54.782032303, 65.11473671), (44.167295593, 54.5))
            ThreePointArc((44.167295593, 54.5), (45.631397208, 49.035898385), (51.095498823, 50.5))
            ThreePointArc((51.095498823, 50.5), (58.782032303, 58.186533479), (69.282032303, 61))
            ThreePointArc((69.282032303, 61), (73.282032303, 65), (69.282032303, 69))
        make_face(mode=Mode.SUBTRACT)
    extrude(amount=BOSS_EXTRUDE1_DEPTH)


solid = part.part
